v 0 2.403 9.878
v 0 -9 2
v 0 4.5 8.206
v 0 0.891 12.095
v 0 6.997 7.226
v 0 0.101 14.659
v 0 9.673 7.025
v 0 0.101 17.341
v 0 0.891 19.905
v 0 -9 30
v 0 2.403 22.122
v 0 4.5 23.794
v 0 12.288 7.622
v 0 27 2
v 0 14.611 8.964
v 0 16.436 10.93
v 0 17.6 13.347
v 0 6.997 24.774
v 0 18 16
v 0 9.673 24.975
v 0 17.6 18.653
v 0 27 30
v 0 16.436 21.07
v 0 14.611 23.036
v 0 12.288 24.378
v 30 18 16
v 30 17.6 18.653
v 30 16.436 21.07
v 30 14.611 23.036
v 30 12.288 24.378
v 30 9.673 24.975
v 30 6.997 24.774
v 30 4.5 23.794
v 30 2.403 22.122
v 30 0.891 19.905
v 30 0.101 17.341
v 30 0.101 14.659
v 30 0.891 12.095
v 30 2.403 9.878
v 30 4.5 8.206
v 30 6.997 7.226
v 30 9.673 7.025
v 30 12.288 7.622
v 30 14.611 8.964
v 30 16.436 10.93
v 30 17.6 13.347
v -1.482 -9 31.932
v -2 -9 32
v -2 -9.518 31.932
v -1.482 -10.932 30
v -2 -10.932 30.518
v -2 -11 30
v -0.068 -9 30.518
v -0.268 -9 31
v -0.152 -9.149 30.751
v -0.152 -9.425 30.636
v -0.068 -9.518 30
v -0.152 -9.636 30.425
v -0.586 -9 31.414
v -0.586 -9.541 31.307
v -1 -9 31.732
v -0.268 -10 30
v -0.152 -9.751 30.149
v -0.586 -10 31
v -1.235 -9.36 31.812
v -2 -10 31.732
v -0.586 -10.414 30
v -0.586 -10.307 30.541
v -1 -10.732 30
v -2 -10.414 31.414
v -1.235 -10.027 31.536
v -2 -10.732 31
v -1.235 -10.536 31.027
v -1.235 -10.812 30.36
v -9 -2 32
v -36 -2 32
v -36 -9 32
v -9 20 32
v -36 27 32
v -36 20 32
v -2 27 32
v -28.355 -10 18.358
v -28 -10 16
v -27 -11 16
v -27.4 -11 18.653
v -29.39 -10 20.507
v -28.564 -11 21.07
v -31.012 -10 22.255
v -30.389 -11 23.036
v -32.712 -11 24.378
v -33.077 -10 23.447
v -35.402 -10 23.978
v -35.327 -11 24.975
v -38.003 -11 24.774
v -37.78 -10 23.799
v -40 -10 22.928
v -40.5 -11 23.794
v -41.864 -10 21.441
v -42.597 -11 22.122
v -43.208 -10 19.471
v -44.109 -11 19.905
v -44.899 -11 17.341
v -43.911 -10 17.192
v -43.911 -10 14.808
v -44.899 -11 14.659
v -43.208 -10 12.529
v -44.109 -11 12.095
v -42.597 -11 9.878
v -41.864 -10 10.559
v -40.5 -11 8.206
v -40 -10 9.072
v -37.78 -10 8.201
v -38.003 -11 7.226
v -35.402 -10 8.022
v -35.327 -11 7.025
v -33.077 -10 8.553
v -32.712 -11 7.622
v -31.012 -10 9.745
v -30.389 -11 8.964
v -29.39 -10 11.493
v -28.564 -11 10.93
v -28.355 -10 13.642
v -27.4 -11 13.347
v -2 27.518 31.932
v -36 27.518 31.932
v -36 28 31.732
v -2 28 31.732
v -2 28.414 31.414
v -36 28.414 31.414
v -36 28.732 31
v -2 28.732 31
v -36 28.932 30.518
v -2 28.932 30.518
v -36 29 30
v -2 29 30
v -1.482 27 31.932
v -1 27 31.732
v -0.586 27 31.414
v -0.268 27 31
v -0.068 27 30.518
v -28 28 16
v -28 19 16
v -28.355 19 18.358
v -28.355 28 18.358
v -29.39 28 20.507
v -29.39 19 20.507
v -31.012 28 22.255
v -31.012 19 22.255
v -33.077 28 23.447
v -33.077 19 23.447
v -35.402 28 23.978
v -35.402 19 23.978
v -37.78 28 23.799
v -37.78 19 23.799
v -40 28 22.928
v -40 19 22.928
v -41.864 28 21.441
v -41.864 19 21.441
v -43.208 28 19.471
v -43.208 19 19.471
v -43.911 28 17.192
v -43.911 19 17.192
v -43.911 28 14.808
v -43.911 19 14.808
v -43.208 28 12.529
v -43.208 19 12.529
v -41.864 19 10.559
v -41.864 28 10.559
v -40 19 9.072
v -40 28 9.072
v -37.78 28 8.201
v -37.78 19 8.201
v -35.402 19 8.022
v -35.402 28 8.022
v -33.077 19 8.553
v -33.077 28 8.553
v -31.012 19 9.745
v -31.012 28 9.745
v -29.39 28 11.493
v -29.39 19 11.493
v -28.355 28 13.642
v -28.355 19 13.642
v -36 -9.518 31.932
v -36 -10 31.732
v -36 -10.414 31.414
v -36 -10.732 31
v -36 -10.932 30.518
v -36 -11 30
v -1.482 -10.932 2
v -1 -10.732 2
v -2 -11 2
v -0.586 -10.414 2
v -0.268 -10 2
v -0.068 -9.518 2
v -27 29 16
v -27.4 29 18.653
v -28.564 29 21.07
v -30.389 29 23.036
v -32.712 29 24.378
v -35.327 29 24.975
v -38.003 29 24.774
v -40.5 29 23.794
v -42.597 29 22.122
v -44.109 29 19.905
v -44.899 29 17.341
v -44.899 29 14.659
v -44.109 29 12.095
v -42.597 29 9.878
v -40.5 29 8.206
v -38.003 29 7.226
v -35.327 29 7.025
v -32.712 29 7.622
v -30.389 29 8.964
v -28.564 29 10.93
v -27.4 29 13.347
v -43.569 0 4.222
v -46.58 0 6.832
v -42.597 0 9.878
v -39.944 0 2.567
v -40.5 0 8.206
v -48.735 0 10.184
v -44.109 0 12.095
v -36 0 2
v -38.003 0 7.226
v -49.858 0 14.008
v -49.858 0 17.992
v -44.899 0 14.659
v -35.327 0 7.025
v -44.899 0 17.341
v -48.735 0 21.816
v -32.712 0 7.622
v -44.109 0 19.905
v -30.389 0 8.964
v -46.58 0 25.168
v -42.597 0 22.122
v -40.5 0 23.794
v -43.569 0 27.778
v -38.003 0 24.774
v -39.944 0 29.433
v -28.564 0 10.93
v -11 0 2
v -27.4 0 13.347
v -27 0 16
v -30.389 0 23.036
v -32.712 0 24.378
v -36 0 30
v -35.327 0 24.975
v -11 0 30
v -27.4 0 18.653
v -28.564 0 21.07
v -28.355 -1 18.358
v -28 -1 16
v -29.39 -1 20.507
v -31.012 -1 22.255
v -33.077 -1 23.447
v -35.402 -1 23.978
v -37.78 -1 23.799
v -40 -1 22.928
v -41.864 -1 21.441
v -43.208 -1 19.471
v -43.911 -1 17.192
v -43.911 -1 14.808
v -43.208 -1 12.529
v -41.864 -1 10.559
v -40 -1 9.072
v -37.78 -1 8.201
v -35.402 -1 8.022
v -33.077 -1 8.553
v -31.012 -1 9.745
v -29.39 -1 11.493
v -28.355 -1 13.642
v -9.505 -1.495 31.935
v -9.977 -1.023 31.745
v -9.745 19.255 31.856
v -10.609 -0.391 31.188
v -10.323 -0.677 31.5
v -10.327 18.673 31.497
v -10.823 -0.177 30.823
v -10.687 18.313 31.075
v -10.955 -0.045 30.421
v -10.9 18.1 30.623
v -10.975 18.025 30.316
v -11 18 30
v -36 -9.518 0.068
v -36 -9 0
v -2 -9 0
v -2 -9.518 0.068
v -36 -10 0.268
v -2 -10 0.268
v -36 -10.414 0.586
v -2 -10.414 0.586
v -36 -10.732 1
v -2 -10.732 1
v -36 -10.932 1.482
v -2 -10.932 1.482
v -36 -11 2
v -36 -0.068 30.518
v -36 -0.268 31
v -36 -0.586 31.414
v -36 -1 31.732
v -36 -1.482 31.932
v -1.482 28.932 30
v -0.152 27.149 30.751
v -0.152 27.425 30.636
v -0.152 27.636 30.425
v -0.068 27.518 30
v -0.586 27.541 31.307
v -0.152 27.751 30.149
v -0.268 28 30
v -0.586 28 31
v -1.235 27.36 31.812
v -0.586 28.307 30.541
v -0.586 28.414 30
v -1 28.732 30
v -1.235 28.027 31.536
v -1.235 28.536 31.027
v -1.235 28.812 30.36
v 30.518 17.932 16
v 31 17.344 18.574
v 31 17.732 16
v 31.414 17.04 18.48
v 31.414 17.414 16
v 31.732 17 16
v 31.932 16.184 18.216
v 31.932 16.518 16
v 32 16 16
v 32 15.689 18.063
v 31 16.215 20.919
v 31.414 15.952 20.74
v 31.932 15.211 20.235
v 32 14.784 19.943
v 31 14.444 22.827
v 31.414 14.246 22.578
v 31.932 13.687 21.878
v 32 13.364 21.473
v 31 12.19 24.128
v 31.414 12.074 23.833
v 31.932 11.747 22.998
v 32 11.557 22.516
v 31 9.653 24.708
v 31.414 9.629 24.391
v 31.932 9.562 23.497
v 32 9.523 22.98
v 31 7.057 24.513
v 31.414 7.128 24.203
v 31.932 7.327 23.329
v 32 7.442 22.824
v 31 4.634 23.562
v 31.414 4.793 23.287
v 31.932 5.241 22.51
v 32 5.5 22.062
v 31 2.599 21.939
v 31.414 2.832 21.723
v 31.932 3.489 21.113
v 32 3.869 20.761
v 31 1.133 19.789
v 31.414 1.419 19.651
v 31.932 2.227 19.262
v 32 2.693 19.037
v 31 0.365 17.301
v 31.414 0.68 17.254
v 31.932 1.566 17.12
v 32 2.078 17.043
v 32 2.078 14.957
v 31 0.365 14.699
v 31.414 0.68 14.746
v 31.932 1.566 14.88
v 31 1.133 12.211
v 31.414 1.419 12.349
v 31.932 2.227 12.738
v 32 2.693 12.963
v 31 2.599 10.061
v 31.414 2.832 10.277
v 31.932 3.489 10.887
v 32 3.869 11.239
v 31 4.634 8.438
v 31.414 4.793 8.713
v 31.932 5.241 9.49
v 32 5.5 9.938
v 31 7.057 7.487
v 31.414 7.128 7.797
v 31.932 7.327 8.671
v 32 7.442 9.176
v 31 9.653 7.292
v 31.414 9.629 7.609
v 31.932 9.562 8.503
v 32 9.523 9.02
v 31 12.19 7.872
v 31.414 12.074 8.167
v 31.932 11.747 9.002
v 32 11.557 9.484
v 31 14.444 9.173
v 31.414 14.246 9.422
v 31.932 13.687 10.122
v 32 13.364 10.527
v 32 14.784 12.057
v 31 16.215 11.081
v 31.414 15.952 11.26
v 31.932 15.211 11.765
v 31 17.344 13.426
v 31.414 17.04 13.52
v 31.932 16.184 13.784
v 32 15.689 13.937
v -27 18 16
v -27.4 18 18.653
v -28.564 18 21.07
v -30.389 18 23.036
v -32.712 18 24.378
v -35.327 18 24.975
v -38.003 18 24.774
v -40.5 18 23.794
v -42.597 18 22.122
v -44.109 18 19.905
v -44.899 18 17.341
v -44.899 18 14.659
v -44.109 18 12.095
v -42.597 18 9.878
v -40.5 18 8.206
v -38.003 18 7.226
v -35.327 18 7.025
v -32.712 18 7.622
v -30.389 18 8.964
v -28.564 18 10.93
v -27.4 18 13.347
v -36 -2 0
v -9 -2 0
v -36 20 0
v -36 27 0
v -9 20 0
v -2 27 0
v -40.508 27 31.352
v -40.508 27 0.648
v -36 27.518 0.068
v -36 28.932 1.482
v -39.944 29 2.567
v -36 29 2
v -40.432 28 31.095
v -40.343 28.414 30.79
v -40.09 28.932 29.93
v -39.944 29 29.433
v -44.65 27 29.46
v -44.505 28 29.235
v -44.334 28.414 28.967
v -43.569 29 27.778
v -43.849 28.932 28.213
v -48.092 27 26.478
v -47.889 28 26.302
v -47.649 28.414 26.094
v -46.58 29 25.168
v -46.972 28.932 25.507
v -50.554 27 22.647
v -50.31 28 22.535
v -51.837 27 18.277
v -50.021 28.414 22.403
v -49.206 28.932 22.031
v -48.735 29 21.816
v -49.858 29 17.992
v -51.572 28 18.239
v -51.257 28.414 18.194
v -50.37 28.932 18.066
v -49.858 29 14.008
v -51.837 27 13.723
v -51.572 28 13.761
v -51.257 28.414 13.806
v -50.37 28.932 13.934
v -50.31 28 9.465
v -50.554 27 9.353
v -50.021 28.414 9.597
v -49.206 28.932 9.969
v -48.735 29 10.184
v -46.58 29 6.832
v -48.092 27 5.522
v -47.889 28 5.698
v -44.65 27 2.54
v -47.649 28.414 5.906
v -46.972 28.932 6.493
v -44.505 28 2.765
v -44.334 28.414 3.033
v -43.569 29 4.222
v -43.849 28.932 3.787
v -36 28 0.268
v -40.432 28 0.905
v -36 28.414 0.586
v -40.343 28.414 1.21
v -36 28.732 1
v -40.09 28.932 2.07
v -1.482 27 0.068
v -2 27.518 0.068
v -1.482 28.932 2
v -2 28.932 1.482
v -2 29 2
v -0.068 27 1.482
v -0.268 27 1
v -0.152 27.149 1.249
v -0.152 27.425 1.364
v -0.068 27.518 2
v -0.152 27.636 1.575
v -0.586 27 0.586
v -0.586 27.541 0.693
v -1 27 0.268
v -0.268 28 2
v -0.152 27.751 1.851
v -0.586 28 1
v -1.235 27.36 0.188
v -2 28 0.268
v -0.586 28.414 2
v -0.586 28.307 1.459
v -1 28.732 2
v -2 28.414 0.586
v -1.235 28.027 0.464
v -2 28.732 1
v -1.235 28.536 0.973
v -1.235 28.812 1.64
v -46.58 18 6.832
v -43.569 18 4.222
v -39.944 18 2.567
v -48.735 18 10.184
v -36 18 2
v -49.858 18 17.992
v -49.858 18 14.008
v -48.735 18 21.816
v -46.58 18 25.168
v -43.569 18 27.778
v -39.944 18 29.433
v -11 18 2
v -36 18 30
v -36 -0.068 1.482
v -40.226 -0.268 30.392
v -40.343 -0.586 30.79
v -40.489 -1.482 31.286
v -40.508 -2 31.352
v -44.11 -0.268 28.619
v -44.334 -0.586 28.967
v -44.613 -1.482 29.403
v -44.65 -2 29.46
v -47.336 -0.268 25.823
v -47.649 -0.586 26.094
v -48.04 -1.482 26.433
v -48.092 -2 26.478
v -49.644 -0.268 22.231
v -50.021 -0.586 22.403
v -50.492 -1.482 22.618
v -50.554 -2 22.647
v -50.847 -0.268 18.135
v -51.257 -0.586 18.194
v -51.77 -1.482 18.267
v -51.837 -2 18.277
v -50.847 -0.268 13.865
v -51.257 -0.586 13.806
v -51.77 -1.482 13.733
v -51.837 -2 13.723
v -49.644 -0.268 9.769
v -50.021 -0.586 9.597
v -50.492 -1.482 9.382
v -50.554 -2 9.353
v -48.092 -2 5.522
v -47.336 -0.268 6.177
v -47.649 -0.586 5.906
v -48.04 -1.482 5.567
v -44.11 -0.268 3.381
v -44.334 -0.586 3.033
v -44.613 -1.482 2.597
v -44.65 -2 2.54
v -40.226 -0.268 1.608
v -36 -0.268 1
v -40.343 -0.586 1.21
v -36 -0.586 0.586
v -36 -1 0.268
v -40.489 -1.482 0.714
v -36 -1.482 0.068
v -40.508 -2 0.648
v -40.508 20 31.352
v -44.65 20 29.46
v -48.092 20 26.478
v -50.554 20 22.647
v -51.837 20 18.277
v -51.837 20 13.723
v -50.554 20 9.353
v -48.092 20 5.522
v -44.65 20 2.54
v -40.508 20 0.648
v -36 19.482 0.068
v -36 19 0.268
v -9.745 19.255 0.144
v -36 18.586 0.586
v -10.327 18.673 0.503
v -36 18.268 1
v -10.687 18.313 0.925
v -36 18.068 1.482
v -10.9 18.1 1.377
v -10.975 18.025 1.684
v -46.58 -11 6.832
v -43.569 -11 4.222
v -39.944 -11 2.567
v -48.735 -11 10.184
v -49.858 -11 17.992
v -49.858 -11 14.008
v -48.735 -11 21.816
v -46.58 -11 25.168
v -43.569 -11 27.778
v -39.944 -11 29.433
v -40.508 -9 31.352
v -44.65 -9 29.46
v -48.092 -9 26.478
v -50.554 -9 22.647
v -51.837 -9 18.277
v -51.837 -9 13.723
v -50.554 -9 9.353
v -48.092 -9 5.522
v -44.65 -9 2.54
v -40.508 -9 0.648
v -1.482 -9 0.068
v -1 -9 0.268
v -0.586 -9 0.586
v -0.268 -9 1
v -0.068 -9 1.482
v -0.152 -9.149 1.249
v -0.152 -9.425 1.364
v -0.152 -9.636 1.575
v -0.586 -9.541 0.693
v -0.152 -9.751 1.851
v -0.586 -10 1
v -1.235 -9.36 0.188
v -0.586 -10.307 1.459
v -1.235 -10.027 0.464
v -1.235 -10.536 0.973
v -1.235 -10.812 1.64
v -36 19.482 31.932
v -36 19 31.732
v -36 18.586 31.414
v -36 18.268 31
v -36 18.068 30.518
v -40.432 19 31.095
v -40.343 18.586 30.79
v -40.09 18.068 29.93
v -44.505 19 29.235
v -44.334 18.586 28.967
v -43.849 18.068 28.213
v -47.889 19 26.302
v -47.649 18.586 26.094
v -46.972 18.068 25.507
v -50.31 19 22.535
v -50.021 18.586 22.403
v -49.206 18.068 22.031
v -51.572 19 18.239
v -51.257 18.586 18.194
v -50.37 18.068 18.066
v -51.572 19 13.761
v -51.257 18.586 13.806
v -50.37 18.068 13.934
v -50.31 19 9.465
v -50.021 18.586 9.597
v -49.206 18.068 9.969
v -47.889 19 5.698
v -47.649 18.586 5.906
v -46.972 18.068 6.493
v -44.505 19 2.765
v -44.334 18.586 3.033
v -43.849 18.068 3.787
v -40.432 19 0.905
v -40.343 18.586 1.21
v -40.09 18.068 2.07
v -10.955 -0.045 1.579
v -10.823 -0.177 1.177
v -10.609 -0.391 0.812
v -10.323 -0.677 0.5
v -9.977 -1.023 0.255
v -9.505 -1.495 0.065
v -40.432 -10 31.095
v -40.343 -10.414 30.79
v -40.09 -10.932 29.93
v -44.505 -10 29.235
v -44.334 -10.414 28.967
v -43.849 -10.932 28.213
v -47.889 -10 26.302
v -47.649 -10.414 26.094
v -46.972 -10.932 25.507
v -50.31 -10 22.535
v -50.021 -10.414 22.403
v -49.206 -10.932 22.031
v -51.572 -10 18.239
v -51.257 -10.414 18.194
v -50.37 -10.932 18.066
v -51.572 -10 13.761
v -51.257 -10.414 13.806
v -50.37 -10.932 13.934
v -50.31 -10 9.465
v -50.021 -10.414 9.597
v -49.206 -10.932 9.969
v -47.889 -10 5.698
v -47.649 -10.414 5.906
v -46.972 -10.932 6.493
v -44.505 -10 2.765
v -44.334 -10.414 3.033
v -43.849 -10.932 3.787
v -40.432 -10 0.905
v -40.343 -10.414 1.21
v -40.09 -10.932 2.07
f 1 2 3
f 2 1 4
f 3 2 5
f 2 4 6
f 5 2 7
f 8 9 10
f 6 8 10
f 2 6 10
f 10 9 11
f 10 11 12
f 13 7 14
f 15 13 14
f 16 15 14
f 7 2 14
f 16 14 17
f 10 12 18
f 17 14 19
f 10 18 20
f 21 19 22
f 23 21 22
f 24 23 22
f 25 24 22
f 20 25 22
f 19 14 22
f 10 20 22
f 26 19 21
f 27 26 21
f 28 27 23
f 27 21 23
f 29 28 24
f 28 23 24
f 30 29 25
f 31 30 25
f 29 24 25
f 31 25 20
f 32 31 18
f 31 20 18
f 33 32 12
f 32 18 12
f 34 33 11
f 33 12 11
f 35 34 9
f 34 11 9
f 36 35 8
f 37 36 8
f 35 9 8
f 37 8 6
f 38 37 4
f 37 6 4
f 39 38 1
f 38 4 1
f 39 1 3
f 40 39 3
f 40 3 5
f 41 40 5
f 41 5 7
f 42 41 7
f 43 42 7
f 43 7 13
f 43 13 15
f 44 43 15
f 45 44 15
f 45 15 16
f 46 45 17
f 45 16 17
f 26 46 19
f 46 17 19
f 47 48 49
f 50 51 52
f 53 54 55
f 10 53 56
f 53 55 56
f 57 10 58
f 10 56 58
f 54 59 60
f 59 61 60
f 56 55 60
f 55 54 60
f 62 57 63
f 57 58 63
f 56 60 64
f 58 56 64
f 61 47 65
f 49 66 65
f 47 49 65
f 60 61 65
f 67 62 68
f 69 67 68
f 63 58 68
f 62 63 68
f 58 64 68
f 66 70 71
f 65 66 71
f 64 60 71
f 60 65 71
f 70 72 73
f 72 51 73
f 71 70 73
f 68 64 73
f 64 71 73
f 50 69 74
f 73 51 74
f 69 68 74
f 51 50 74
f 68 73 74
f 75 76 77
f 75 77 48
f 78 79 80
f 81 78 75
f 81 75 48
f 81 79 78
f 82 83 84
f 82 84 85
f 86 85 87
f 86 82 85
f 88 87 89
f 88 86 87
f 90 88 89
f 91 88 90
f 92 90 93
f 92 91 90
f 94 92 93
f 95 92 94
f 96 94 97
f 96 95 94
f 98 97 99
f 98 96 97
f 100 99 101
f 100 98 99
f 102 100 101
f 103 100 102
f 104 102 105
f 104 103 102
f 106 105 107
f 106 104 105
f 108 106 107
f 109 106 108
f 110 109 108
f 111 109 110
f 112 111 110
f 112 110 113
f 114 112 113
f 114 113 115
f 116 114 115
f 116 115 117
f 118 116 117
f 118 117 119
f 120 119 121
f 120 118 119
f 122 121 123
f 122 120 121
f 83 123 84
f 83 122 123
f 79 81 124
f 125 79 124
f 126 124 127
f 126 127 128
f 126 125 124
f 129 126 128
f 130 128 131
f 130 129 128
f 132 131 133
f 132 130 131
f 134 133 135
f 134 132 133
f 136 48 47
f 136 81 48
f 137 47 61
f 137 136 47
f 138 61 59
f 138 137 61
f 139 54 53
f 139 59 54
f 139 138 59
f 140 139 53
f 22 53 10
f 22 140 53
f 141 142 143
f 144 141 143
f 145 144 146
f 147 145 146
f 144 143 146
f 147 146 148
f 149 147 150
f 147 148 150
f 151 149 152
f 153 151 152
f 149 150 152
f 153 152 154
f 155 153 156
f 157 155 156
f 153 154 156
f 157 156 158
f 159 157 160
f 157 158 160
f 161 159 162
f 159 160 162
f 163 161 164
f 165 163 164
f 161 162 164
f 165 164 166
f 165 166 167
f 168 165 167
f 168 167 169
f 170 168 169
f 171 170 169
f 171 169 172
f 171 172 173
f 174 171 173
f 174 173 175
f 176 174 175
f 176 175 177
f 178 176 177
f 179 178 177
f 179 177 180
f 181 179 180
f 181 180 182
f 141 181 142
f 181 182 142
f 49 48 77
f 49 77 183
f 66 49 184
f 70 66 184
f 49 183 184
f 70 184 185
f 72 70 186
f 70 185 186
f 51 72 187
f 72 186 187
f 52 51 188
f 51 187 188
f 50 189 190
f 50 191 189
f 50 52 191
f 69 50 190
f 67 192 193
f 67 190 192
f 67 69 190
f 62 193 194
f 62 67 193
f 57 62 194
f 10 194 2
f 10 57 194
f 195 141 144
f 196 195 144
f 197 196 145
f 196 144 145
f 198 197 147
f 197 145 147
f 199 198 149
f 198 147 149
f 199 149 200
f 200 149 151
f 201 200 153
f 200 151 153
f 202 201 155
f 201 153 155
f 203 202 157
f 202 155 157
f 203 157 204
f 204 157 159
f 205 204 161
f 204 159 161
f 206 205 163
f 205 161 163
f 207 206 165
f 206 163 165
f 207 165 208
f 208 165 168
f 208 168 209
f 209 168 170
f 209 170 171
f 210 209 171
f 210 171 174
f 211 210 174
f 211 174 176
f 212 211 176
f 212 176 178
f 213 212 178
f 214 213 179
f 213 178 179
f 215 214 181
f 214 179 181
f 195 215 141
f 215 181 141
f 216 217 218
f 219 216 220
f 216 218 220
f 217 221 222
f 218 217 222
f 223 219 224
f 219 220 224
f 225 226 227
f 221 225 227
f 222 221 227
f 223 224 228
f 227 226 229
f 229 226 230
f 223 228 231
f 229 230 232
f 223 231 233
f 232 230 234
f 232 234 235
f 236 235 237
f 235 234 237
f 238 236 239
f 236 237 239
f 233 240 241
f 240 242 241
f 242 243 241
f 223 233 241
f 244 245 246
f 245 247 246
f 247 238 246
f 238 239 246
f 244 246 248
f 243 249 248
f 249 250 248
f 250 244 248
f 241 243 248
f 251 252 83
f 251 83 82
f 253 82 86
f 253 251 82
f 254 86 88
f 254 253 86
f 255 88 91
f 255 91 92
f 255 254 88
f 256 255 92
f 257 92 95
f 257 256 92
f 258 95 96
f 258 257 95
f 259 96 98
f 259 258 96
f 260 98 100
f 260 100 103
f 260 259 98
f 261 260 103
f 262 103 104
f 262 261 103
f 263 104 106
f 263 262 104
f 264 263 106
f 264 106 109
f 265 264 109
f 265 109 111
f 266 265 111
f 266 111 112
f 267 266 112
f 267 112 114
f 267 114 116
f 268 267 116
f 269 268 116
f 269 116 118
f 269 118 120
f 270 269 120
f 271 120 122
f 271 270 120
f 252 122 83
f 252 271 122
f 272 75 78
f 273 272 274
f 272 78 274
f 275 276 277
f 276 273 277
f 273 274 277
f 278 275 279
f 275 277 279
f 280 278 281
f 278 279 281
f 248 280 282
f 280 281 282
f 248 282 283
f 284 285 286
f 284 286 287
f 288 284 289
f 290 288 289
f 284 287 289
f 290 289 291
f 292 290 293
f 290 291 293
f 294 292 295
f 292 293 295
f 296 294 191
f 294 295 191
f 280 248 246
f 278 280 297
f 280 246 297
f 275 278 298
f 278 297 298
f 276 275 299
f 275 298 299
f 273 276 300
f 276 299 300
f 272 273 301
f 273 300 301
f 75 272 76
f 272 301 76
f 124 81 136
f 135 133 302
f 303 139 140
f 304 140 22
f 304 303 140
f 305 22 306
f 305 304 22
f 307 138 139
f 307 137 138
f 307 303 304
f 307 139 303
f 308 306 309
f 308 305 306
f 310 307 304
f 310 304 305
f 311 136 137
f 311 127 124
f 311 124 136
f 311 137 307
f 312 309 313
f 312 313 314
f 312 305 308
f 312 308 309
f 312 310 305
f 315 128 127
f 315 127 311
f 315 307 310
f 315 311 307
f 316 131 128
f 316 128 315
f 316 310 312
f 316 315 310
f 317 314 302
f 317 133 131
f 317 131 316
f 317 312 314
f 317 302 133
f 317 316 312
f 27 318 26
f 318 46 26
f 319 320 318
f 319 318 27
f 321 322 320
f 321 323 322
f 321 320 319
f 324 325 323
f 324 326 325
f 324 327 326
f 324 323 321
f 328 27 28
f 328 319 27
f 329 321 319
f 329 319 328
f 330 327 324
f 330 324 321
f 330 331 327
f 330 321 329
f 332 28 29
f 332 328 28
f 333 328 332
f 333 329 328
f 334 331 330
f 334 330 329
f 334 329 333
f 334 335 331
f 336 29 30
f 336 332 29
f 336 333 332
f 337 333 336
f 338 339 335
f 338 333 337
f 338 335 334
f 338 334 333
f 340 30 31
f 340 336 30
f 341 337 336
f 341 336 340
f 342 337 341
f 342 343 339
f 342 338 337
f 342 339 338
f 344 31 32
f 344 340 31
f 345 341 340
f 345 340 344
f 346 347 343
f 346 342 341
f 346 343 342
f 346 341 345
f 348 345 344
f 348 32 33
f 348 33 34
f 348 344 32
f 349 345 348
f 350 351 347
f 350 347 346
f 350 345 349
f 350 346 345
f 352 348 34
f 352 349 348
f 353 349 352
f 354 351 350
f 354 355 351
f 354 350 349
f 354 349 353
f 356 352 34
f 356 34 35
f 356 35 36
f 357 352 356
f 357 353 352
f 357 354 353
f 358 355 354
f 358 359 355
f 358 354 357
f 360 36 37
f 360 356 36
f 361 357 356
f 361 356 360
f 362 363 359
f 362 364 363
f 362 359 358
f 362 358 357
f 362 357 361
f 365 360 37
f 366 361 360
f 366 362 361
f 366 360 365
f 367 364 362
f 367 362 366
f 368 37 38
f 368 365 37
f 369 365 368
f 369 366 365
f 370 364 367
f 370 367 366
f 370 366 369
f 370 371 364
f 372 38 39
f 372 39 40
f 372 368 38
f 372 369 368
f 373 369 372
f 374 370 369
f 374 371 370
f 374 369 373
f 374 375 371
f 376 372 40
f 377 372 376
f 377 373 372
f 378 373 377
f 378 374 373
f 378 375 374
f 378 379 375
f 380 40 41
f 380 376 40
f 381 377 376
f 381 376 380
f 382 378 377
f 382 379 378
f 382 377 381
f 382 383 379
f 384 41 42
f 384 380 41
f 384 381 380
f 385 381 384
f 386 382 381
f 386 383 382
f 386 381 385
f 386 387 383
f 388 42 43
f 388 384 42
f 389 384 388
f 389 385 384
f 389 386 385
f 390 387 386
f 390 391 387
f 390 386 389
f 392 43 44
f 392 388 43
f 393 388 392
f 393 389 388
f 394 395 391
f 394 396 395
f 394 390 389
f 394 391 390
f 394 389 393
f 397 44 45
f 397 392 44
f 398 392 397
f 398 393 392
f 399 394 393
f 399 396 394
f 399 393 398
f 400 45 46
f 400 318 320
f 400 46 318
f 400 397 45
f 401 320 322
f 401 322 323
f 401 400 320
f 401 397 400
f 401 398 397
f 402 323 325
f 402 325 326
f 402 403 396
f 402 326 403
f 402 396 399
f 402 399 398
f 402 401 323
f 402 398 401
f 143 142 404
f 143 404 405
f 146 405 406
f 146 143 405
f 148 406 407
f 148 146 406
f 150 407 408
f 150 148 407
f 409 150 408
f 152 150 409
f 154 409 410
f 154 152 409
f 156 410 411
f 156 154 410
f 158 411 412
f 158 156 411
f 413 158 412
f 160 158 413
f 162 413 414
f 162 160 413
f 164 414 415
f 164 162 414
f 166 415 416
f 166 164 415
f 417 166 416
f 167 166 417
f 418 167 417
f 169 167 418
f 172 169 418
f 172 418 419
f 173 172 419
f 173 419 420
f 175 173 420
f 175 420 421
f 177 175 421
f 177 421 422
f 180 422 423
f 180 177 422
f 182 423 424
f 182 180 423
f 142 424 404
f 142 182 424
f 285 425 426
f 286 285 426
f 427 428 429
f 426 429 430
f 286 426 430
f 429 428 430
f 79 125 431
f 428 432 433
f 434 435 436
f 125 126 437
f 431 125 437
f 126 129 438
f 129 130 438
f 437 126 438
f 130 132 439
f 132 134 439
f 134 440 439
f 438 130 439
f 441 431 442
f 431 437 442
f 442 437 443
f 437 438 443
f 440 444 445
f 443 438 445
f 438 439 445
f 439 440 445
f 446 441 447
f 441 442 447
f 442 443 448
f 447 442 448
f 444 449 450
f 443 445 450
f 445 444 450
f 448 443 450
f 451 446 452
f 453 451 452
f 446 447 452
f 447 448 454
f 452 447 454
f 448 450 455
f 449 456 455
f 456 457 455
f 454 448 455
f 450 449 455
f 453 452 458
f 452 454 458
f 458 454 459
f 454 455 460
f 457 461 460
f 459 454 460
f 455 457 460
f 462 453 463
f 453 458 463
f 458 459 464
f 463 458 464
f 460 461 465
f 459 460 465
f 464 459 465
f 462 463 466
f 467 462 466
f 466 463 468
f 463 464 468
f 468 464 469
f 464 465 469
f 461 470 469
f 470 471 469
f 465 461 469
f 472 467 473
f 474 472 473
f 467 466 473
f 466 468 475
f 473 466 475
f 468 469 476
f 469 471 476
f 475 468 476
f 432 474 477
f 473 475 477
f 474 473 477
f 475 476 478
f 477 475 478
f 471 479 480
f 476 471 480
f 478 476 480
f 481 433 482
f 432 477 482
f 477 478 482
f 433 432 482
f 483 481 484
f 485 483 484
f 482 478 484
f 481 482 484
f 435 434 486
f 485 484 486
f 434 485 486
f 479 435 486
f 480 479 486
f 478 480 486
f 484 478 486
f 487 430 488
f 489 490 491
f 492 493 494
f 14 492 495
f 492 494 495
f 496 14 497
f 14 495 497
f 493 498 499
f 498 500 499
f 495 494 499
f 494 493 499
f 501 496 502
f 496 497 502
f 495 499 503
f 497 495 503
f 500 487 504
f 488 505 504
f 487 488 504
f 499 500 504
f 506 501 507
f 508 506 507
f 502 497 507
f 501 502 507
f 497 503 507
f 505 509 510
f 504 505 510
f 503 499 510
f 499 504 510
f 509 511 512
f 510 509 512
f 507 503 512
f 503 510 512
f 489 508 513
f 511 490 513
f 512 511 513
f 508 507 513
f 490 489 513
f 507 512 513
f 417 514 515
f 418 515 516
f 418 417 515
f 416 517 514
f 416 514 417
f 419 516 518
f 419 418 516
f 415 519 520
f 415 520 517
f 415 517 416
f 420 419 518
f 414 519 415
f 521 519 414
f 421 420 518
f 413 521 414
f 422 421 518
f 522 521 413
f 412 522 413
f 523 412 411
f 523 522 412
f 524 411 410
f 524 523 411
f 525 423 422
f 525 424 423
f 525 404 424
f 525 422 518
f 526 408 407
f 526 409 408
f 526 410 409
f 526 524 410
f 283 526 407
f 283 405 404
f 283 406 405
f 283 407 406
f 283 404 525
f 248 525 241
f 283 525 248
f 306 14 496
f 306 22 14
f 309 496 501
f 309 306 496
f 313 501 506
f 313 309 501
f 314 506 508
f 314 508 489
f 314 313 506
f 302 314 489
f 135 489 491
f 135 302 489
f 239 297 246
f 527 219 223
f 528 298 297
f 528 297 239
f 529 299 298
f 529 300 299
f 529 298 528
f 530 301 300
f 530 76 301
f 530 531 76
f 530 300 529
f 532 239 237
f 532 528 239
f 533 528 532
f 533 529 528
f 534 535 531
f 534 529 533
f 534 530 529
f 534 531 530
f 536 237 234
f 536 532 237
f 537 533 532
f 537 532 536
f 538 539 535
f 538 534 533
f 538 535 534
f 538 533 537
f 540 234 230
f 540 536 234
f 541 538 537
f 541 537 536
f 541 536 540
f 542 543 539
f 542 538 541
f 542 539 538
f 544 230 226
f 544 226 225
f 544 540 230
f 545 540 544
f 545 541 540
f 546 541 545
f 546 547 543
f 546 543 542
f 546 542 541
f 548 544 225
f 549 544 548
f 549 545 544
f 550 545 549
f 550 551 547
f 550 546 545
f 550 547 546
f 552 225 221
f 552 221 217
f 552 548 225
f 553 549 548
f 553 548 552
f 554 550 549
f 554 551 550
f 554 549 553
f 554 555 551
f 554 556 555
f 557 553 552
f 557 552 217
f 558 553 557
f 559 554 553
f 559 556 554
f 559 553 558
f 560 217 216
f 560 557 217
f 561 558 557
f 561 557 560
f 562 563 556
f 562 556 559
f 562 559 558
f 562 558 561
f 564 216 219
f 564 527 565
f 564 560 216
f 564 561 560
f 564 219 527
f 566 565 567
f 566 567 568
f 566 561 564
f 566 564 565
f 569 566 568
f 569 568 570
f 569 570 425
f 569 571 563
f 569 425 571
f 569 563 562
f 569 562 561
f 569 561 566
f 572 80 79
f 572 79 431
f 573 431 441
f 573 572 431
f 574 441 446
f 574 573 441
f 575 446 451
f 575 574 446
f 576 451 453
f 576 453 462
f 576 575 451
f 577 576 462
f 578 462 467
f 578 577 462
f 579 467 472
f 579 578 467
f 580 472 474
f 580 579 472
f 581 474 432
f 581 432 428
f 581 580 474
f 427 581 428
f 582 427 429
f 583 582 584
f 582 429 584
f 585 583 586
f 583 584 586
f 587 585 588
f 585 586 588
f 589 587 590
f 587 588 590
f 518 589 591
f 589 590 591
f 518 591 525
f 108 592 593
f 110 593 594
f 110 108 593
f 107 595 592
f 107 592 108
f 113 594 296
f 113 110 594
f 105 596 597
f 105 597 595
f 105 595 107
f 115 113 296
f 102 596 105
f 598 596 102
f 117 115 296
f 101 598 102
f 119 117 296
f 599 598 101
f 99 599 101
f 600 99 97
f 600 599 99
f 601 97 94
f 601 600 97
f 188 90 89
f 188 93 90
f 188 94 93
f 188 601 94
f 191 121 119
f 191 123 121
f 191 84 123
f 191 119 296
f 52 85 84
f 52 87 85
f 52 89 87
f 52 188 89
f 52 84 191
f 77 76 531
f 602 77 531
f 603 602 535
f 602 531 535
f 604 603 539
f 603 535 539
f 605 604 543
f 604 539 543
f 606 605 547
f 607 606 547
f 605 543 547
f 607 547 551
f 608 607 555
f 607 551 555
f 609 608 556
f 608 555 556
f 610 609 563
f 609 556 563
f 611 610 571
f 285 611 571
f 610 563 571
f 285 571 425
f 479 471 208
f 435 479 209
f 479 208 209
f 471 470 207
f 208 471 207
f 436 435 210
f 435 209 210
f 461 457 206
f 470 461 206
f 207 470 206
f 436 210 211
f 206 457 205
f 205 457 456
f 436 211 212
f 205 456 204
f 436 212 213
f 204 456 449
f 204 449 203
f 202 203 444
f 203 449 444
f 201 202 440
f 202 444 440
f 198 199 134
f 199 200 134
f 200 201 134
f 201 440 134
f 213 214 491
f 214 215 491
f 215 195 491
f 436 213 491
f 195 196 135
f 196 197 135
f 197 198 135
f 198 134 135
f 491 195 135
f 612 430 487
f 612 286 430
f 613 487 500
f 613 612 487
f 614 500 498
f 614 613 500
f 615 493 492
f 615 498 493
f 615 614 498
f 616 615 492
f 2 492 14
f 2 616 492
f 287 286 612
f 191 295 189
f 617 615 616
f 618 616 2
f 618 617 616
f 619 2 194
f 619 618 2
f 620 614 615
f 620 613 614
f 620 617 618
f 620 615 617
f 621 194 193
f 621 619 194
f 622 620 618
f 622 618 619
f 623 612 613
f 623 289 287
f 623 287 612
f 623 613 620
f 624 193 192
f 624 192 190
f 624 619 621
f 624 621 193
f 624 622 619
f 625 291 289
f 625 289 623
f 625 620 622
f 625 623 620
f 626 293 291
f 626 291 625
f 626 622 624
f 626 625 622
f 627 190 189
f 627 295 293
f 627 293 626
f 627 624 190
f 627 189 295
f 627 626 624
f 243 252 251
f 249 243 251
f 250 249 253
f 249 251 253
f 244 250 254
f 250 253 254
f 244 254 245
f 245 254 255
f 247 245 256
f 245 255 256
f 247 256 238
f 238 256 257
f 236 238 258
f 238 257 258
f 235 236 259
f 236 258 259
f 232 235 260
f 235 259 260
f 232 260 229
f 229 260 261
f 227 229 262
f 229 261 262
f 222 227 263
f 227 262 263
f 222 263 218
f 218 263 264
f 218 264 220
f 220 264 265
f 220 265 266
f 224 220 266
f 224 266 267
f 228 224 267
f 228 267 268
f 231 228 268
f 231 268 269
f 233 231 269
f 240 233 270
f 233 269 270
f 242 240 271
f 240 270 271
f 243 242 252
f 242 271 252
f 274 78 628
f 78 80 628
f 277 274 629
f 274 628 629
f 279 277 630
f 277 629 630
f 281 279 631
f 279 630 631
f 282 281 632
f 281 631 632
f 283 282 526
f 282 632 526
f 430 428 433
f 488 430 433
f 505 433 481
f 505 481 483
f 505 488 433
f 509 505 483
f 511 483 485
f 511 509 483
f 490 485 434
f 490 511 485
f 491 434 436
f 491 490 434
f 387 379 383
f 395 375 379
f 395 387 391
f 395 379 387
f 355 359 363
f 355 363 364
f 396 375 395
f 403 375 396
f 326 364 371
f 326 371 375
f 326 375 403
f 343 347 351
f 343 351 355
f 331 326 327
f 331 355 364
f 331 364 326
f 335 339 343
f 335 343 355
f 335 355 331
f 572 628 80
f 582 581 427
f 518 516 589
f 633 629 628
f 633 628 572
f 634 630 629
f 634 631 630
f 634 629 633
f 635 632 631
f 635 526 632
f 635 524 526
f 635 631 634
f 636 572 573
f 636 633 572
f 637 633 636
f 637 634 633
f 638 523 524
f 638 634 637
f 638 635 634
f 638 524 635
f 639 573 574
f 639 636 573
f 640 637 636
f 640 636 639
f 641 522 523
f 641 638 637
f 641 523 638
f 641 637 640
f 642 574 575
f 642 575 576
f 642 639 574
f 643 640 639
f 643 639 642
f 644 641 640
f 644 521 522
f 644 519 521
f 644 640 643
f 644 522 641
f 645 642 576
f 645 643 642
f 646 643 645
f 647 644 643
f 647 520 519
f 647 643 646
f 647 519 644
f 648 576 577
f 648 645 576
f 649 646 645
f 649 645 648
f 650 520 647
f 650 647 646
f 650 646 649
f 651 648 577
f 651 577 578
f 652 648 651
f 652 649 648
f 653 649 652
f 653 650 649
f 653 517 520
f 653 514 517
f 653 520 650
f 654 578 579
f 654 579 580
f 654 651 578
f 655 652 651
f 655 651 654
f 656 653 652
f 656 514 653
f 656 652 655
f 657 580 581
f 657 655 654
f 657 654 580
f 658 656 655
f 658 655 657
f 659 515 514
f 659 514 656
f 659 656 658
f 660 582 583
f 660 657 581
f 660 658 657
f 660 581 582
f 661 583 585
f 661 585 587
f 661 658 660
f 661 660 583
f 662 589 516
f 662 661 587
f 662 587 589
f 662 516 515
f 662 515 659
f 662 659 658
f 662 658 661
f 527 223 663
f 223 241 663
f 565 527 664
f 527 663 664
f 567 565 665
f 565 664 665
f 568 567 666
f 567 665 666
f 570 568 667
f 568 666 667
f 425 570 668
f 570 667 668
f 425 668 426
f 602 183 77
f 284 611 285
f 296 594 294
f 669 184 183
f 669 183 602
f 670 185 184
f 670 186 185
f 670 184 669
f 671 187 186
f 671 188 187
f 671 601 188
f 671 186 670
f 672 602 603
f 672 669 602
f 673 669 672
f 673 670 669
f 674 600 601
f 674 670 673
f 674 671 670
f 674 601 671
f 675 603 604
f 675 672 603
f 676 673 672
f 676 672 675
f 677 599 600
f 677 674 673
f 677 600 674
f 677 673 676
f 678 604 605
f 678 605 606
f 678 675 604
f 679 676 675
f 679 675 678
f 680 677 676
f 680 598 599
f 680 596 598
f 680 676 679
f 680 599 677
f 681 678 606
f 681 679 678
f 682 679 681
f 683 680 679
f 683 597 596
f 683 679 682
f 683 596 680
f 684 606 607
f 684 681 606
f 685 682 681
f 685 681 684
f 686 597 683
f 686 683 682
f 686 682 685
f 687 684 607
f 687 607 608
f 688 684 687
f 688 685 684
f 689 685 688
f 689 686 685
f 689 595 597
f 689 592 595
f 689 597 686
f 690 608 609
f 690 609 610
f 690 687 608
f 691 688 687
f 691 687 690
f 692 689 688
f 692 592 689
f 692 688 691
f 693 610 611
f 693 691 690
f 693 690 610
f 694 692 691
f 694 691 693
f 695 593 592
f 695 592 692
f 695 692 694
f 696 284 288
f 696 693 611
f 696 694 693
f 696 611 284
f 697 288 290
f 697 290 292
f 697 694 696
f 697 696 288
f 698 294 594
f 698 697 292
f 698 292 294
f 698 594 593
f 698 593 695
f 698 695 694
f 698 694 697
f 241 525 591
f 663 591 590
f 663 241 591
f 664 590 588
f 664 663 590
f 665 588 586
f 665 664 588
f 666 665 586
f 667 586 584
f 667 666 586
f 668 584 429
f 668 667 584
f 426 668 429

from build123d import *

# Parameters (mm, degrees)
F0_R     = 8
F0_W     = 11
F0_H     = 32
F1_DEPTH = 11
F2_DEPTH = 9
F4_R     = 9
F5_DEPTH = 32
F6_SIZE  = 1
F7_R     = 2


with BuildPart() as f1:
    # F0 (on Front) → F1 (new body)
    with BuildSketch(Plane.XZ):
        with BuildLine():
            Line((-36, 0), (-11, 0))
            Line((-11, 0), (-11, 32))
            Line((-11, 32), (-36, 32))
            ThreePointArc((-36, 32), (-52, 16), (-36, 0))
        make_face()
        with Locations((-36, 16)):
            Circle(F0_R, mode=Mode.SUBTRACT)
        with Locations((-5.5, 16)):
            Rectangle(F0_W, F0_H)
    extrude(amount=F1_DEPTH)

    # F0 (on Front) → F2 (join)
    with BuildSketch(Plane.XZ):
        with Locations((-5.5, 16)):
            Rectangle(F0_W, F0_H)
    extrude(amount=-F2_DEPTH)

    # F3: F1 across face


with BuildPart() as f1_1:
    add(f1.part)
    add(f1.part.mirror(Plane(origin=(-5.5, 9, 16), x_dir=(1, 0, 0), z_dir=(0, 1, 0))))

    # F4 (on face) → F5 (join)
    with BuildSketch(Plane.YZ):
        with Locations((9, 16)):
            Circle(F4_R)
    extrude(amount=F5_DEPTH)

    # F6
    f6_edges = [f1_1.edges().sort_by_distance(p)[0] for p in [
        (-28, -5.5, 16),
        (-44, 0, 16),
        (-44, -11, 16),
        (-28, 23.5, 16),
        (-44, 18, 16),
        (-44, 29, 16),
    ]]
    chamfer(f6_edges, length=F6_SIZE)

    # F7
    f7_edges = [f1_1.edges().sort_by_distance(p)[0] for p in [
        (-18, -11, 32),
        (-36, -5.5, 32),
        (-23.5, 0, 32),
        (-11, 9, 32),
        (-23.5, 18, 32),
        (-36, 23.5, 32),
        (-18, 29, 32),
        (0, 9, 32),
        (-36, -5.5, 0),
        (-18, -11, 0),
        (0, 9, 0),
        (-18, 29, 0),
        (-36, 23.5, 0),
        (-23.5, 18, 0),
        (-11, 9, 0),
        (-23.5, 0, 0),
        (32, 0, 16),
        (0, 29, 16),
        (0, -11, 16),
    ]]
    fillet(f7_edges, radius=F7_R)


solid = f1_1.part
